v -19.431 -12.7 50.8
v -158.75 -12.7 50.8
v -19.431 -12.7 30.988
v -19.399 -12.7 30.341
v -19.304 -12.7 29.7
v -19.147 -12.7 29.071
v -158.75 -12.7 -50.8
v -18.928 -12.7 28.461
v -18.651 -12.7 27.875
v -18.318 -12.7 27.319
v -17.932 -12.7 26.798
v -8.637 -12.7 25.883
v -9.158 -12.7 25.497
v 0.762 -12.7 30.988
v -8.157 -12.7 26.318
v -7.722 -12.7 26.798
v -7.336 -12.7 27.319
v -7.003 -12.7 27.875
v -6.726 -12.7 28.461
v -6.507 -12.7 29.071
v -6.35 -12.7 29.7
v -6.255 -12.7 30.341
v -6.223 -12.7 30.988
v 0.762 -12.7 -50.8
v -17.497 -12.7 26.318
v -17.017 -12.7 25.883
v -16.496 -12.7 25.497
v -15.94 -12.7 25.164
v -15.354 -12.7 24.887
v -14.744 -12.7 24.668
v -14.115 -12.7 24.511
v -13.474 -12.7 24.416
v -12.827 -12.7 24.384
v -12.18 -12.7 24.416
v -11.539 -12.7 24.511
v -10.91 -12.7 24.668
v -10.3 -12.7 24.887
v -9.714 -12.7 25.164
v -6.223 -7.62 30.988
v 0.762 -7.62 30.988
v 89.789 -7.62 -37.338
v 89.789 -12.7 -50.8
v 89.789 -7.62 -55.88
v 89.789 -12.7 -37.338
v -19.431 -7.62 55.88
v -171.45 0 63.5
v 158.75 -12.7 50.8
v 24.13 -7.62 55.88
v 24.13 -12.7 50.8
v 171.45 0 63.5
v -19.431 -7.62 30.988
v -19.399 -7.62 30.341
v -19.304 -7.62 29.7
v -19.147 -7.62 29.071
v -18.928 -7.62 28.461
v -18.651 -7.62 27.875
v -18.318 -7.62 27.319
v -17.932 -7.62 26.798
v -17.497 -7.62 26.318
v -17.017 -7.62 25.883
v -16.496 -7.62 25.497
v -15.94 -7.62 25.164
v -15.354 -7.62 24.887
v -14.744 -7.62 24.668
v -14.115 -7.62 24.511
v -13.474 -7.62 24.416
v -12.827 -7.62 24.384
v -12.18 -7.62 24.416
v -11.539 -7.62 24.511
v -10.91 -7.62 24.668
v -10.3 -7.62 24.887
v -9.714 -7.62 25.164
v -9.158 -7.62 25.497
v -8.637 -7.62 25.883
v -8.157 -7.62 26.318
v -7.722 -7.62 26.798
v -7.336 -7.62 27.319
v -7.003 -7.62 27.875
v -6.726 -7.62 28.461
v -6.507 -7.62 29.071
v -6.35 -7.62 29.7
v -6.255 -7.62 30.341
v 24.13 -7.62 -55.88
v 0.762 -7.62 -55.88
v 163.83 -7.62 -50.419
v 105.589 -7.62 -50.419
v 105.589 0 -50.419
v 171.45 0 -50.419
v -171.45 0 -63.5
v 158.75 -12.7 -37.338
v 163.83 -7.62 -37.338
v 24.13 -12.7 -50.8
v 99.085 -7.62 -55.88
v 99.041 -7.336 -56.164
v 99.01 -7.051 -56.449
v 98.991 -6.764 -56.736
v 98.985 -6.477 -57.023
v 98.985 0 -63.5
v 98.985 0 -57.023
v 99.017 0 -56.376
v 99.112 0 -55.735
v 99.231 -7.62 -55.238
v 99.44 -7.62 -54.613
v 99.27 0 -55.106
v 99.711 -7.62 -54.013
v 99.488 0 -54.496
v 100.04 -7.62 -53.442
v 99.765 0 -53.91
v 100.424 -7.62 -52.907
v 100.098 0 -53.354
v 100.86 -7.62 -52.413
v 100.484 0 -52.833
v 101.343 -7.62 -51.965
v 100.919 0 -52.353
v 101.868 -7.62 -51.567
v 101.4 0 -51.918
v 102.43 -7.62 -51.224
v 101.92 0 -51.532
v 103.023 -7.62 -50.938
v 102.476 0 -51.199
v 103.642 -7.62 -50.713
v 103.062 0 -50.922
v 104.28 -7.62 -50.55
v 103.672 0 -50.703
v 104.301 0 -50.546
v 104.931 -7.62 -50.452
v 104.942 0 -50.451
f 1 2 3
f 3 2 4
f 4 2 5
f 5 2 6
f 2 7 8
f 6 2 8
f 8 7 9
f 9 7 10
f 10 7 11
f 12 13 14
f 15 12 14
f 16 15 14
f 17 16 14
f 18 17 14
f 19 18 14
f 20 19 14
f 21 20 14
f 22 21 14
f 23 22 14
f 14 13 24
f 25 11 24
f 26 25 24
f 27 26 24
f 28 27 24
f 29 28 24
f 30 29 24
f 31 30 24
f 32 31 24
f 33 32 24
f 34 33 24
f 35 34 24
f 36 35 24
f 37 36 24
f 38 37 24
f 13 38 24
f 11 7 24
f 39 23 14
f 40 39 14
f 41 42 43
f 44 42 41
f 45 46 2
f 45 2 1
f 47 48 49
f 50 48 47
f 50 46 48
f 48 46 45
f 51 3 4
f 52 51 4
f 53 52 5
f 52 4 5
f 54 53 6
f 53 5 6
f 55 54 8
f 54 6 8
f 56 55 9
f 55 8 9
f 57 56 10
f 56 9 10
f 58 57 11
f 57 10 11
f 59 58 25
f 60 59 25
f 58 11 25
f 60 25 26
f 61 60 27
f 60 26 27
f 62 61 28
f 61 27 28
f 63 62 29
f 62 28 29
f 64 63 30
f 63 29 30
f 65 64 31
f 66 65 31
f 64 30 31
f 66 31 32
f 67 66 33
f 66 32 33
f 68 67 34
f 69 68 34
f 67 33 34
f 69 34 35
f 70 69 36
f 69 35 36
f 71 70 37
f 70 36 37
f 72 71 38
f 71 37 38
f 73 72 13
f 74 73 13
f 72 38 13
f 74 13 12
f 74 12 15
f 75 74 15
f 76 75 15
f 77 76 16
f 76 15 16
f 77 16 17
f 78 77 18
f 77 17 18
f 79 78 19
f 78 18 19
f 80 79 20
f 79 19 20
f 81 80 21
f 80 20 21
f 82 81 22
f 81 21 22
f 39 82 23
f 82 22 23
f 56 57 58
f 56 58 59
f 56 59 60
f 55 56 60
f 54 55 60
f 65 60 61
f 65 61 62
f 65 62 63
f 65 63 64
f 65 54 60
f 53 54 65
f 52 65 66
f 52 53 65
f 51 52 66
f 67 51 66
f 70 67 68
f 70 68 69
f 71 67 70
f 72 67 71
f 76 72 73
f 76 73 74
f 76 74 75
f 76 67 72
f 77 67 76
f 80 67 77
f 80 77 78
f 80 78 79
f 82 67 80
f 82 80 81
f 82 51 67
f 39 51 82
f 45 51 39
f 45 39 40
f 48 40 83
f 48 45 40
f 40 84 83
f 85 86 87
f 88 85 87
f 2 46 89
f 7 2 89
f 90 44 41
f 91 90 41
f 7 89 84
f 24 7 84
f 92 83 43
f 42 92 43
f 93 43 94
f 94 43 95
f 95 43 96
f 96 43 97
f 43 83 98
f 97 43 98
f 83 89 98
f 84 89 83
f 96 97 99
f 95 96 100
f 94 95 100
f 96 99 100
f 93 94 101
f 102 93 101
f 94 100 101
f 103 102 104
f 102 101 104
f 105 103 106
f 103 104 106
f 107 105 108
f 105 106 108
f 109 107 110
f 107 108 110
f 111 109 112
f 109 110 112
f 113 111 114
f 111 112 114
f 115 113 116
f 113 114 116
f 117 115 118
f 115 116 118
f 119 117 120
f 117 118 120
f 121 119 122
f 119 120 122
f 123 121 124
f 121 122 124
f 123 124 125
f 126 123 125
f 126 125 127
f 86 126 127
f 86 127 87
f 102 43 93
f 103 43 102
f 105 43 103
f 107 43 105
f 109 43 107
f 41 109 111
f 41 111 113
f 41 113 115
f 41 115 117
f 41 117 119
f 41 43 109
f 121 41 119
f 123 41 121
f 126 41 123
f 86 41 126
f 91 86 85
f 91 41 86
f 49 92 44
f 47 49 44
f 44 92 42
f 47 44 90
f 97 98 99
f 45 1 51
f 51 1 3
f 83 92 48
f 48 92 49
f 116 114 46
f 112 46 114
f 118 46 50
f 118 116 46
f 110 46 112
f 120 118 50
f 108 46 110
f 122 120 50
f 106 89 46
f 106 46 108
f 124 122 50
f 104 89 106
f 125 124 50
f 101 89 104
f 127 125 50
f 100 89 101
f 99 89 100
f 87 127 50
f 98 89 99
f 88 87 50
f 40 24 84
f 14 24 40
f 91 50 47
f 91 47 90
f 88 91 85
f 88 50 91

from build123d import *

# Parameters (mm, degrees)
SKETCH1_W           = 342.9
SKETCH1_H           = 127
BOSS_EXTRUDE1_DEPTH = 12.7
DRAFT1_ANGLE        = -45
SKETCH2_W           = 23.368
SKETCH2_H           = 127
CUT_EXTRUDE1_DEPTH  = 5.08
CUT_EXTRUDE2_DEPTH  = 5.08
SKETCH4_W           = 81.661
SKETCH4_H           = 26.162
CUT_EXTRUDE3_DEPTH  = 5.08
SKETCH5_W           = 72.464825645
SKETCH5_H           = 13.081
CUT_EXTRUDE4_DEPTH  = 184.272045059
FILLET1_R           = 6.604


with BuildPart() as part:
    # Sketch1 → Boss-Extrude1 (new body)
    with BuildSketch(Plane(origin=(0, 0, 0), x_dir=(1, 0, 0), z_dir=(0, 1, 0))):
        Rectangle(SKETCH1_W, SKETCH1_H)
    extrude(amount=-BOSS_EXTRUDE1_DEPTH)

    # Draft1
    draft1_faces = [part.faces().sort_by_distance(p)[0] for p in [
        (0, -6.35, -63.5),
        (-171.45, -6.35, 0),
        (171.45, -6.35, 0),
        (0, -6.35, 63.5),
    ]]
    draft(draft1_faces, Plane.ZX, DRAFT1_ANGLE)

    # Sketch2 → Cut-Extrude1 (cut)
    with BuildSketch(Plane.XZ.offset(12.7)):
        with Locations((12.446, 0)):
            Rectangle(SKETCH2_W, SKETCH2_H)
    extrude(amount=-CUT_EXTRUDE1_DEPTH, mode=Mode.SUBTRACT)

    # Sketch3 → Cut-Extrude2 (cut)
    with BuildSketch(Plane.XZ.offset(12.7)):
        with BuildLine():
            Line((0.762, 55.88), (-19.431, 55.88))
            Line((-19.431, 55.88), (-19.431, 30.988))
            ThreePointArc((-19.431, 30.988), (-12.827, 24.384), (-6.223, 30.988))
            Line((-6.223, 30.988), (0.762, 30.988))
            Line((0.762, 30.988), (0.762, 55.88))
        make_face()
    extrude(amount=-CUT_EXTRUDE2_DEPTH, mode=Mode.SUBTRACT)

    # Sketch4 → Cut-Extrude3 (cut)
    with BuildSketch(Plane.XZ.offset(12.7)):
        with Locations((130.6195, -50.419)):
            Rectangle(SKETCH4_W, SKETCH4_H)
    extrude(amount=-CUT_EXTRUDE3_DEPTH, mode=Mode.SUBTRACT)

    # Sketch5 → Cut-Extrude4 (cut, through all)
    with BuildSketch(Plane.XZ.offset(12.7)):
        with Locations((135.217587178, -56.9595)):
            Rectangle(SKETCH5_W, SKETCH5_H)
    extrude(amount=-CUT_EXTRUDE4_DEPTH, mode=Mode.SUBTRACT)

    # Fillet1
    fillet1_edges = [part.edges().sort_by_distance(p)[0] for p in [
        (98.985174355, -3.81, -50.419),
    ]]
    fillet(fillet1_edges, radius=FILLET1_R)


solid = part.part
